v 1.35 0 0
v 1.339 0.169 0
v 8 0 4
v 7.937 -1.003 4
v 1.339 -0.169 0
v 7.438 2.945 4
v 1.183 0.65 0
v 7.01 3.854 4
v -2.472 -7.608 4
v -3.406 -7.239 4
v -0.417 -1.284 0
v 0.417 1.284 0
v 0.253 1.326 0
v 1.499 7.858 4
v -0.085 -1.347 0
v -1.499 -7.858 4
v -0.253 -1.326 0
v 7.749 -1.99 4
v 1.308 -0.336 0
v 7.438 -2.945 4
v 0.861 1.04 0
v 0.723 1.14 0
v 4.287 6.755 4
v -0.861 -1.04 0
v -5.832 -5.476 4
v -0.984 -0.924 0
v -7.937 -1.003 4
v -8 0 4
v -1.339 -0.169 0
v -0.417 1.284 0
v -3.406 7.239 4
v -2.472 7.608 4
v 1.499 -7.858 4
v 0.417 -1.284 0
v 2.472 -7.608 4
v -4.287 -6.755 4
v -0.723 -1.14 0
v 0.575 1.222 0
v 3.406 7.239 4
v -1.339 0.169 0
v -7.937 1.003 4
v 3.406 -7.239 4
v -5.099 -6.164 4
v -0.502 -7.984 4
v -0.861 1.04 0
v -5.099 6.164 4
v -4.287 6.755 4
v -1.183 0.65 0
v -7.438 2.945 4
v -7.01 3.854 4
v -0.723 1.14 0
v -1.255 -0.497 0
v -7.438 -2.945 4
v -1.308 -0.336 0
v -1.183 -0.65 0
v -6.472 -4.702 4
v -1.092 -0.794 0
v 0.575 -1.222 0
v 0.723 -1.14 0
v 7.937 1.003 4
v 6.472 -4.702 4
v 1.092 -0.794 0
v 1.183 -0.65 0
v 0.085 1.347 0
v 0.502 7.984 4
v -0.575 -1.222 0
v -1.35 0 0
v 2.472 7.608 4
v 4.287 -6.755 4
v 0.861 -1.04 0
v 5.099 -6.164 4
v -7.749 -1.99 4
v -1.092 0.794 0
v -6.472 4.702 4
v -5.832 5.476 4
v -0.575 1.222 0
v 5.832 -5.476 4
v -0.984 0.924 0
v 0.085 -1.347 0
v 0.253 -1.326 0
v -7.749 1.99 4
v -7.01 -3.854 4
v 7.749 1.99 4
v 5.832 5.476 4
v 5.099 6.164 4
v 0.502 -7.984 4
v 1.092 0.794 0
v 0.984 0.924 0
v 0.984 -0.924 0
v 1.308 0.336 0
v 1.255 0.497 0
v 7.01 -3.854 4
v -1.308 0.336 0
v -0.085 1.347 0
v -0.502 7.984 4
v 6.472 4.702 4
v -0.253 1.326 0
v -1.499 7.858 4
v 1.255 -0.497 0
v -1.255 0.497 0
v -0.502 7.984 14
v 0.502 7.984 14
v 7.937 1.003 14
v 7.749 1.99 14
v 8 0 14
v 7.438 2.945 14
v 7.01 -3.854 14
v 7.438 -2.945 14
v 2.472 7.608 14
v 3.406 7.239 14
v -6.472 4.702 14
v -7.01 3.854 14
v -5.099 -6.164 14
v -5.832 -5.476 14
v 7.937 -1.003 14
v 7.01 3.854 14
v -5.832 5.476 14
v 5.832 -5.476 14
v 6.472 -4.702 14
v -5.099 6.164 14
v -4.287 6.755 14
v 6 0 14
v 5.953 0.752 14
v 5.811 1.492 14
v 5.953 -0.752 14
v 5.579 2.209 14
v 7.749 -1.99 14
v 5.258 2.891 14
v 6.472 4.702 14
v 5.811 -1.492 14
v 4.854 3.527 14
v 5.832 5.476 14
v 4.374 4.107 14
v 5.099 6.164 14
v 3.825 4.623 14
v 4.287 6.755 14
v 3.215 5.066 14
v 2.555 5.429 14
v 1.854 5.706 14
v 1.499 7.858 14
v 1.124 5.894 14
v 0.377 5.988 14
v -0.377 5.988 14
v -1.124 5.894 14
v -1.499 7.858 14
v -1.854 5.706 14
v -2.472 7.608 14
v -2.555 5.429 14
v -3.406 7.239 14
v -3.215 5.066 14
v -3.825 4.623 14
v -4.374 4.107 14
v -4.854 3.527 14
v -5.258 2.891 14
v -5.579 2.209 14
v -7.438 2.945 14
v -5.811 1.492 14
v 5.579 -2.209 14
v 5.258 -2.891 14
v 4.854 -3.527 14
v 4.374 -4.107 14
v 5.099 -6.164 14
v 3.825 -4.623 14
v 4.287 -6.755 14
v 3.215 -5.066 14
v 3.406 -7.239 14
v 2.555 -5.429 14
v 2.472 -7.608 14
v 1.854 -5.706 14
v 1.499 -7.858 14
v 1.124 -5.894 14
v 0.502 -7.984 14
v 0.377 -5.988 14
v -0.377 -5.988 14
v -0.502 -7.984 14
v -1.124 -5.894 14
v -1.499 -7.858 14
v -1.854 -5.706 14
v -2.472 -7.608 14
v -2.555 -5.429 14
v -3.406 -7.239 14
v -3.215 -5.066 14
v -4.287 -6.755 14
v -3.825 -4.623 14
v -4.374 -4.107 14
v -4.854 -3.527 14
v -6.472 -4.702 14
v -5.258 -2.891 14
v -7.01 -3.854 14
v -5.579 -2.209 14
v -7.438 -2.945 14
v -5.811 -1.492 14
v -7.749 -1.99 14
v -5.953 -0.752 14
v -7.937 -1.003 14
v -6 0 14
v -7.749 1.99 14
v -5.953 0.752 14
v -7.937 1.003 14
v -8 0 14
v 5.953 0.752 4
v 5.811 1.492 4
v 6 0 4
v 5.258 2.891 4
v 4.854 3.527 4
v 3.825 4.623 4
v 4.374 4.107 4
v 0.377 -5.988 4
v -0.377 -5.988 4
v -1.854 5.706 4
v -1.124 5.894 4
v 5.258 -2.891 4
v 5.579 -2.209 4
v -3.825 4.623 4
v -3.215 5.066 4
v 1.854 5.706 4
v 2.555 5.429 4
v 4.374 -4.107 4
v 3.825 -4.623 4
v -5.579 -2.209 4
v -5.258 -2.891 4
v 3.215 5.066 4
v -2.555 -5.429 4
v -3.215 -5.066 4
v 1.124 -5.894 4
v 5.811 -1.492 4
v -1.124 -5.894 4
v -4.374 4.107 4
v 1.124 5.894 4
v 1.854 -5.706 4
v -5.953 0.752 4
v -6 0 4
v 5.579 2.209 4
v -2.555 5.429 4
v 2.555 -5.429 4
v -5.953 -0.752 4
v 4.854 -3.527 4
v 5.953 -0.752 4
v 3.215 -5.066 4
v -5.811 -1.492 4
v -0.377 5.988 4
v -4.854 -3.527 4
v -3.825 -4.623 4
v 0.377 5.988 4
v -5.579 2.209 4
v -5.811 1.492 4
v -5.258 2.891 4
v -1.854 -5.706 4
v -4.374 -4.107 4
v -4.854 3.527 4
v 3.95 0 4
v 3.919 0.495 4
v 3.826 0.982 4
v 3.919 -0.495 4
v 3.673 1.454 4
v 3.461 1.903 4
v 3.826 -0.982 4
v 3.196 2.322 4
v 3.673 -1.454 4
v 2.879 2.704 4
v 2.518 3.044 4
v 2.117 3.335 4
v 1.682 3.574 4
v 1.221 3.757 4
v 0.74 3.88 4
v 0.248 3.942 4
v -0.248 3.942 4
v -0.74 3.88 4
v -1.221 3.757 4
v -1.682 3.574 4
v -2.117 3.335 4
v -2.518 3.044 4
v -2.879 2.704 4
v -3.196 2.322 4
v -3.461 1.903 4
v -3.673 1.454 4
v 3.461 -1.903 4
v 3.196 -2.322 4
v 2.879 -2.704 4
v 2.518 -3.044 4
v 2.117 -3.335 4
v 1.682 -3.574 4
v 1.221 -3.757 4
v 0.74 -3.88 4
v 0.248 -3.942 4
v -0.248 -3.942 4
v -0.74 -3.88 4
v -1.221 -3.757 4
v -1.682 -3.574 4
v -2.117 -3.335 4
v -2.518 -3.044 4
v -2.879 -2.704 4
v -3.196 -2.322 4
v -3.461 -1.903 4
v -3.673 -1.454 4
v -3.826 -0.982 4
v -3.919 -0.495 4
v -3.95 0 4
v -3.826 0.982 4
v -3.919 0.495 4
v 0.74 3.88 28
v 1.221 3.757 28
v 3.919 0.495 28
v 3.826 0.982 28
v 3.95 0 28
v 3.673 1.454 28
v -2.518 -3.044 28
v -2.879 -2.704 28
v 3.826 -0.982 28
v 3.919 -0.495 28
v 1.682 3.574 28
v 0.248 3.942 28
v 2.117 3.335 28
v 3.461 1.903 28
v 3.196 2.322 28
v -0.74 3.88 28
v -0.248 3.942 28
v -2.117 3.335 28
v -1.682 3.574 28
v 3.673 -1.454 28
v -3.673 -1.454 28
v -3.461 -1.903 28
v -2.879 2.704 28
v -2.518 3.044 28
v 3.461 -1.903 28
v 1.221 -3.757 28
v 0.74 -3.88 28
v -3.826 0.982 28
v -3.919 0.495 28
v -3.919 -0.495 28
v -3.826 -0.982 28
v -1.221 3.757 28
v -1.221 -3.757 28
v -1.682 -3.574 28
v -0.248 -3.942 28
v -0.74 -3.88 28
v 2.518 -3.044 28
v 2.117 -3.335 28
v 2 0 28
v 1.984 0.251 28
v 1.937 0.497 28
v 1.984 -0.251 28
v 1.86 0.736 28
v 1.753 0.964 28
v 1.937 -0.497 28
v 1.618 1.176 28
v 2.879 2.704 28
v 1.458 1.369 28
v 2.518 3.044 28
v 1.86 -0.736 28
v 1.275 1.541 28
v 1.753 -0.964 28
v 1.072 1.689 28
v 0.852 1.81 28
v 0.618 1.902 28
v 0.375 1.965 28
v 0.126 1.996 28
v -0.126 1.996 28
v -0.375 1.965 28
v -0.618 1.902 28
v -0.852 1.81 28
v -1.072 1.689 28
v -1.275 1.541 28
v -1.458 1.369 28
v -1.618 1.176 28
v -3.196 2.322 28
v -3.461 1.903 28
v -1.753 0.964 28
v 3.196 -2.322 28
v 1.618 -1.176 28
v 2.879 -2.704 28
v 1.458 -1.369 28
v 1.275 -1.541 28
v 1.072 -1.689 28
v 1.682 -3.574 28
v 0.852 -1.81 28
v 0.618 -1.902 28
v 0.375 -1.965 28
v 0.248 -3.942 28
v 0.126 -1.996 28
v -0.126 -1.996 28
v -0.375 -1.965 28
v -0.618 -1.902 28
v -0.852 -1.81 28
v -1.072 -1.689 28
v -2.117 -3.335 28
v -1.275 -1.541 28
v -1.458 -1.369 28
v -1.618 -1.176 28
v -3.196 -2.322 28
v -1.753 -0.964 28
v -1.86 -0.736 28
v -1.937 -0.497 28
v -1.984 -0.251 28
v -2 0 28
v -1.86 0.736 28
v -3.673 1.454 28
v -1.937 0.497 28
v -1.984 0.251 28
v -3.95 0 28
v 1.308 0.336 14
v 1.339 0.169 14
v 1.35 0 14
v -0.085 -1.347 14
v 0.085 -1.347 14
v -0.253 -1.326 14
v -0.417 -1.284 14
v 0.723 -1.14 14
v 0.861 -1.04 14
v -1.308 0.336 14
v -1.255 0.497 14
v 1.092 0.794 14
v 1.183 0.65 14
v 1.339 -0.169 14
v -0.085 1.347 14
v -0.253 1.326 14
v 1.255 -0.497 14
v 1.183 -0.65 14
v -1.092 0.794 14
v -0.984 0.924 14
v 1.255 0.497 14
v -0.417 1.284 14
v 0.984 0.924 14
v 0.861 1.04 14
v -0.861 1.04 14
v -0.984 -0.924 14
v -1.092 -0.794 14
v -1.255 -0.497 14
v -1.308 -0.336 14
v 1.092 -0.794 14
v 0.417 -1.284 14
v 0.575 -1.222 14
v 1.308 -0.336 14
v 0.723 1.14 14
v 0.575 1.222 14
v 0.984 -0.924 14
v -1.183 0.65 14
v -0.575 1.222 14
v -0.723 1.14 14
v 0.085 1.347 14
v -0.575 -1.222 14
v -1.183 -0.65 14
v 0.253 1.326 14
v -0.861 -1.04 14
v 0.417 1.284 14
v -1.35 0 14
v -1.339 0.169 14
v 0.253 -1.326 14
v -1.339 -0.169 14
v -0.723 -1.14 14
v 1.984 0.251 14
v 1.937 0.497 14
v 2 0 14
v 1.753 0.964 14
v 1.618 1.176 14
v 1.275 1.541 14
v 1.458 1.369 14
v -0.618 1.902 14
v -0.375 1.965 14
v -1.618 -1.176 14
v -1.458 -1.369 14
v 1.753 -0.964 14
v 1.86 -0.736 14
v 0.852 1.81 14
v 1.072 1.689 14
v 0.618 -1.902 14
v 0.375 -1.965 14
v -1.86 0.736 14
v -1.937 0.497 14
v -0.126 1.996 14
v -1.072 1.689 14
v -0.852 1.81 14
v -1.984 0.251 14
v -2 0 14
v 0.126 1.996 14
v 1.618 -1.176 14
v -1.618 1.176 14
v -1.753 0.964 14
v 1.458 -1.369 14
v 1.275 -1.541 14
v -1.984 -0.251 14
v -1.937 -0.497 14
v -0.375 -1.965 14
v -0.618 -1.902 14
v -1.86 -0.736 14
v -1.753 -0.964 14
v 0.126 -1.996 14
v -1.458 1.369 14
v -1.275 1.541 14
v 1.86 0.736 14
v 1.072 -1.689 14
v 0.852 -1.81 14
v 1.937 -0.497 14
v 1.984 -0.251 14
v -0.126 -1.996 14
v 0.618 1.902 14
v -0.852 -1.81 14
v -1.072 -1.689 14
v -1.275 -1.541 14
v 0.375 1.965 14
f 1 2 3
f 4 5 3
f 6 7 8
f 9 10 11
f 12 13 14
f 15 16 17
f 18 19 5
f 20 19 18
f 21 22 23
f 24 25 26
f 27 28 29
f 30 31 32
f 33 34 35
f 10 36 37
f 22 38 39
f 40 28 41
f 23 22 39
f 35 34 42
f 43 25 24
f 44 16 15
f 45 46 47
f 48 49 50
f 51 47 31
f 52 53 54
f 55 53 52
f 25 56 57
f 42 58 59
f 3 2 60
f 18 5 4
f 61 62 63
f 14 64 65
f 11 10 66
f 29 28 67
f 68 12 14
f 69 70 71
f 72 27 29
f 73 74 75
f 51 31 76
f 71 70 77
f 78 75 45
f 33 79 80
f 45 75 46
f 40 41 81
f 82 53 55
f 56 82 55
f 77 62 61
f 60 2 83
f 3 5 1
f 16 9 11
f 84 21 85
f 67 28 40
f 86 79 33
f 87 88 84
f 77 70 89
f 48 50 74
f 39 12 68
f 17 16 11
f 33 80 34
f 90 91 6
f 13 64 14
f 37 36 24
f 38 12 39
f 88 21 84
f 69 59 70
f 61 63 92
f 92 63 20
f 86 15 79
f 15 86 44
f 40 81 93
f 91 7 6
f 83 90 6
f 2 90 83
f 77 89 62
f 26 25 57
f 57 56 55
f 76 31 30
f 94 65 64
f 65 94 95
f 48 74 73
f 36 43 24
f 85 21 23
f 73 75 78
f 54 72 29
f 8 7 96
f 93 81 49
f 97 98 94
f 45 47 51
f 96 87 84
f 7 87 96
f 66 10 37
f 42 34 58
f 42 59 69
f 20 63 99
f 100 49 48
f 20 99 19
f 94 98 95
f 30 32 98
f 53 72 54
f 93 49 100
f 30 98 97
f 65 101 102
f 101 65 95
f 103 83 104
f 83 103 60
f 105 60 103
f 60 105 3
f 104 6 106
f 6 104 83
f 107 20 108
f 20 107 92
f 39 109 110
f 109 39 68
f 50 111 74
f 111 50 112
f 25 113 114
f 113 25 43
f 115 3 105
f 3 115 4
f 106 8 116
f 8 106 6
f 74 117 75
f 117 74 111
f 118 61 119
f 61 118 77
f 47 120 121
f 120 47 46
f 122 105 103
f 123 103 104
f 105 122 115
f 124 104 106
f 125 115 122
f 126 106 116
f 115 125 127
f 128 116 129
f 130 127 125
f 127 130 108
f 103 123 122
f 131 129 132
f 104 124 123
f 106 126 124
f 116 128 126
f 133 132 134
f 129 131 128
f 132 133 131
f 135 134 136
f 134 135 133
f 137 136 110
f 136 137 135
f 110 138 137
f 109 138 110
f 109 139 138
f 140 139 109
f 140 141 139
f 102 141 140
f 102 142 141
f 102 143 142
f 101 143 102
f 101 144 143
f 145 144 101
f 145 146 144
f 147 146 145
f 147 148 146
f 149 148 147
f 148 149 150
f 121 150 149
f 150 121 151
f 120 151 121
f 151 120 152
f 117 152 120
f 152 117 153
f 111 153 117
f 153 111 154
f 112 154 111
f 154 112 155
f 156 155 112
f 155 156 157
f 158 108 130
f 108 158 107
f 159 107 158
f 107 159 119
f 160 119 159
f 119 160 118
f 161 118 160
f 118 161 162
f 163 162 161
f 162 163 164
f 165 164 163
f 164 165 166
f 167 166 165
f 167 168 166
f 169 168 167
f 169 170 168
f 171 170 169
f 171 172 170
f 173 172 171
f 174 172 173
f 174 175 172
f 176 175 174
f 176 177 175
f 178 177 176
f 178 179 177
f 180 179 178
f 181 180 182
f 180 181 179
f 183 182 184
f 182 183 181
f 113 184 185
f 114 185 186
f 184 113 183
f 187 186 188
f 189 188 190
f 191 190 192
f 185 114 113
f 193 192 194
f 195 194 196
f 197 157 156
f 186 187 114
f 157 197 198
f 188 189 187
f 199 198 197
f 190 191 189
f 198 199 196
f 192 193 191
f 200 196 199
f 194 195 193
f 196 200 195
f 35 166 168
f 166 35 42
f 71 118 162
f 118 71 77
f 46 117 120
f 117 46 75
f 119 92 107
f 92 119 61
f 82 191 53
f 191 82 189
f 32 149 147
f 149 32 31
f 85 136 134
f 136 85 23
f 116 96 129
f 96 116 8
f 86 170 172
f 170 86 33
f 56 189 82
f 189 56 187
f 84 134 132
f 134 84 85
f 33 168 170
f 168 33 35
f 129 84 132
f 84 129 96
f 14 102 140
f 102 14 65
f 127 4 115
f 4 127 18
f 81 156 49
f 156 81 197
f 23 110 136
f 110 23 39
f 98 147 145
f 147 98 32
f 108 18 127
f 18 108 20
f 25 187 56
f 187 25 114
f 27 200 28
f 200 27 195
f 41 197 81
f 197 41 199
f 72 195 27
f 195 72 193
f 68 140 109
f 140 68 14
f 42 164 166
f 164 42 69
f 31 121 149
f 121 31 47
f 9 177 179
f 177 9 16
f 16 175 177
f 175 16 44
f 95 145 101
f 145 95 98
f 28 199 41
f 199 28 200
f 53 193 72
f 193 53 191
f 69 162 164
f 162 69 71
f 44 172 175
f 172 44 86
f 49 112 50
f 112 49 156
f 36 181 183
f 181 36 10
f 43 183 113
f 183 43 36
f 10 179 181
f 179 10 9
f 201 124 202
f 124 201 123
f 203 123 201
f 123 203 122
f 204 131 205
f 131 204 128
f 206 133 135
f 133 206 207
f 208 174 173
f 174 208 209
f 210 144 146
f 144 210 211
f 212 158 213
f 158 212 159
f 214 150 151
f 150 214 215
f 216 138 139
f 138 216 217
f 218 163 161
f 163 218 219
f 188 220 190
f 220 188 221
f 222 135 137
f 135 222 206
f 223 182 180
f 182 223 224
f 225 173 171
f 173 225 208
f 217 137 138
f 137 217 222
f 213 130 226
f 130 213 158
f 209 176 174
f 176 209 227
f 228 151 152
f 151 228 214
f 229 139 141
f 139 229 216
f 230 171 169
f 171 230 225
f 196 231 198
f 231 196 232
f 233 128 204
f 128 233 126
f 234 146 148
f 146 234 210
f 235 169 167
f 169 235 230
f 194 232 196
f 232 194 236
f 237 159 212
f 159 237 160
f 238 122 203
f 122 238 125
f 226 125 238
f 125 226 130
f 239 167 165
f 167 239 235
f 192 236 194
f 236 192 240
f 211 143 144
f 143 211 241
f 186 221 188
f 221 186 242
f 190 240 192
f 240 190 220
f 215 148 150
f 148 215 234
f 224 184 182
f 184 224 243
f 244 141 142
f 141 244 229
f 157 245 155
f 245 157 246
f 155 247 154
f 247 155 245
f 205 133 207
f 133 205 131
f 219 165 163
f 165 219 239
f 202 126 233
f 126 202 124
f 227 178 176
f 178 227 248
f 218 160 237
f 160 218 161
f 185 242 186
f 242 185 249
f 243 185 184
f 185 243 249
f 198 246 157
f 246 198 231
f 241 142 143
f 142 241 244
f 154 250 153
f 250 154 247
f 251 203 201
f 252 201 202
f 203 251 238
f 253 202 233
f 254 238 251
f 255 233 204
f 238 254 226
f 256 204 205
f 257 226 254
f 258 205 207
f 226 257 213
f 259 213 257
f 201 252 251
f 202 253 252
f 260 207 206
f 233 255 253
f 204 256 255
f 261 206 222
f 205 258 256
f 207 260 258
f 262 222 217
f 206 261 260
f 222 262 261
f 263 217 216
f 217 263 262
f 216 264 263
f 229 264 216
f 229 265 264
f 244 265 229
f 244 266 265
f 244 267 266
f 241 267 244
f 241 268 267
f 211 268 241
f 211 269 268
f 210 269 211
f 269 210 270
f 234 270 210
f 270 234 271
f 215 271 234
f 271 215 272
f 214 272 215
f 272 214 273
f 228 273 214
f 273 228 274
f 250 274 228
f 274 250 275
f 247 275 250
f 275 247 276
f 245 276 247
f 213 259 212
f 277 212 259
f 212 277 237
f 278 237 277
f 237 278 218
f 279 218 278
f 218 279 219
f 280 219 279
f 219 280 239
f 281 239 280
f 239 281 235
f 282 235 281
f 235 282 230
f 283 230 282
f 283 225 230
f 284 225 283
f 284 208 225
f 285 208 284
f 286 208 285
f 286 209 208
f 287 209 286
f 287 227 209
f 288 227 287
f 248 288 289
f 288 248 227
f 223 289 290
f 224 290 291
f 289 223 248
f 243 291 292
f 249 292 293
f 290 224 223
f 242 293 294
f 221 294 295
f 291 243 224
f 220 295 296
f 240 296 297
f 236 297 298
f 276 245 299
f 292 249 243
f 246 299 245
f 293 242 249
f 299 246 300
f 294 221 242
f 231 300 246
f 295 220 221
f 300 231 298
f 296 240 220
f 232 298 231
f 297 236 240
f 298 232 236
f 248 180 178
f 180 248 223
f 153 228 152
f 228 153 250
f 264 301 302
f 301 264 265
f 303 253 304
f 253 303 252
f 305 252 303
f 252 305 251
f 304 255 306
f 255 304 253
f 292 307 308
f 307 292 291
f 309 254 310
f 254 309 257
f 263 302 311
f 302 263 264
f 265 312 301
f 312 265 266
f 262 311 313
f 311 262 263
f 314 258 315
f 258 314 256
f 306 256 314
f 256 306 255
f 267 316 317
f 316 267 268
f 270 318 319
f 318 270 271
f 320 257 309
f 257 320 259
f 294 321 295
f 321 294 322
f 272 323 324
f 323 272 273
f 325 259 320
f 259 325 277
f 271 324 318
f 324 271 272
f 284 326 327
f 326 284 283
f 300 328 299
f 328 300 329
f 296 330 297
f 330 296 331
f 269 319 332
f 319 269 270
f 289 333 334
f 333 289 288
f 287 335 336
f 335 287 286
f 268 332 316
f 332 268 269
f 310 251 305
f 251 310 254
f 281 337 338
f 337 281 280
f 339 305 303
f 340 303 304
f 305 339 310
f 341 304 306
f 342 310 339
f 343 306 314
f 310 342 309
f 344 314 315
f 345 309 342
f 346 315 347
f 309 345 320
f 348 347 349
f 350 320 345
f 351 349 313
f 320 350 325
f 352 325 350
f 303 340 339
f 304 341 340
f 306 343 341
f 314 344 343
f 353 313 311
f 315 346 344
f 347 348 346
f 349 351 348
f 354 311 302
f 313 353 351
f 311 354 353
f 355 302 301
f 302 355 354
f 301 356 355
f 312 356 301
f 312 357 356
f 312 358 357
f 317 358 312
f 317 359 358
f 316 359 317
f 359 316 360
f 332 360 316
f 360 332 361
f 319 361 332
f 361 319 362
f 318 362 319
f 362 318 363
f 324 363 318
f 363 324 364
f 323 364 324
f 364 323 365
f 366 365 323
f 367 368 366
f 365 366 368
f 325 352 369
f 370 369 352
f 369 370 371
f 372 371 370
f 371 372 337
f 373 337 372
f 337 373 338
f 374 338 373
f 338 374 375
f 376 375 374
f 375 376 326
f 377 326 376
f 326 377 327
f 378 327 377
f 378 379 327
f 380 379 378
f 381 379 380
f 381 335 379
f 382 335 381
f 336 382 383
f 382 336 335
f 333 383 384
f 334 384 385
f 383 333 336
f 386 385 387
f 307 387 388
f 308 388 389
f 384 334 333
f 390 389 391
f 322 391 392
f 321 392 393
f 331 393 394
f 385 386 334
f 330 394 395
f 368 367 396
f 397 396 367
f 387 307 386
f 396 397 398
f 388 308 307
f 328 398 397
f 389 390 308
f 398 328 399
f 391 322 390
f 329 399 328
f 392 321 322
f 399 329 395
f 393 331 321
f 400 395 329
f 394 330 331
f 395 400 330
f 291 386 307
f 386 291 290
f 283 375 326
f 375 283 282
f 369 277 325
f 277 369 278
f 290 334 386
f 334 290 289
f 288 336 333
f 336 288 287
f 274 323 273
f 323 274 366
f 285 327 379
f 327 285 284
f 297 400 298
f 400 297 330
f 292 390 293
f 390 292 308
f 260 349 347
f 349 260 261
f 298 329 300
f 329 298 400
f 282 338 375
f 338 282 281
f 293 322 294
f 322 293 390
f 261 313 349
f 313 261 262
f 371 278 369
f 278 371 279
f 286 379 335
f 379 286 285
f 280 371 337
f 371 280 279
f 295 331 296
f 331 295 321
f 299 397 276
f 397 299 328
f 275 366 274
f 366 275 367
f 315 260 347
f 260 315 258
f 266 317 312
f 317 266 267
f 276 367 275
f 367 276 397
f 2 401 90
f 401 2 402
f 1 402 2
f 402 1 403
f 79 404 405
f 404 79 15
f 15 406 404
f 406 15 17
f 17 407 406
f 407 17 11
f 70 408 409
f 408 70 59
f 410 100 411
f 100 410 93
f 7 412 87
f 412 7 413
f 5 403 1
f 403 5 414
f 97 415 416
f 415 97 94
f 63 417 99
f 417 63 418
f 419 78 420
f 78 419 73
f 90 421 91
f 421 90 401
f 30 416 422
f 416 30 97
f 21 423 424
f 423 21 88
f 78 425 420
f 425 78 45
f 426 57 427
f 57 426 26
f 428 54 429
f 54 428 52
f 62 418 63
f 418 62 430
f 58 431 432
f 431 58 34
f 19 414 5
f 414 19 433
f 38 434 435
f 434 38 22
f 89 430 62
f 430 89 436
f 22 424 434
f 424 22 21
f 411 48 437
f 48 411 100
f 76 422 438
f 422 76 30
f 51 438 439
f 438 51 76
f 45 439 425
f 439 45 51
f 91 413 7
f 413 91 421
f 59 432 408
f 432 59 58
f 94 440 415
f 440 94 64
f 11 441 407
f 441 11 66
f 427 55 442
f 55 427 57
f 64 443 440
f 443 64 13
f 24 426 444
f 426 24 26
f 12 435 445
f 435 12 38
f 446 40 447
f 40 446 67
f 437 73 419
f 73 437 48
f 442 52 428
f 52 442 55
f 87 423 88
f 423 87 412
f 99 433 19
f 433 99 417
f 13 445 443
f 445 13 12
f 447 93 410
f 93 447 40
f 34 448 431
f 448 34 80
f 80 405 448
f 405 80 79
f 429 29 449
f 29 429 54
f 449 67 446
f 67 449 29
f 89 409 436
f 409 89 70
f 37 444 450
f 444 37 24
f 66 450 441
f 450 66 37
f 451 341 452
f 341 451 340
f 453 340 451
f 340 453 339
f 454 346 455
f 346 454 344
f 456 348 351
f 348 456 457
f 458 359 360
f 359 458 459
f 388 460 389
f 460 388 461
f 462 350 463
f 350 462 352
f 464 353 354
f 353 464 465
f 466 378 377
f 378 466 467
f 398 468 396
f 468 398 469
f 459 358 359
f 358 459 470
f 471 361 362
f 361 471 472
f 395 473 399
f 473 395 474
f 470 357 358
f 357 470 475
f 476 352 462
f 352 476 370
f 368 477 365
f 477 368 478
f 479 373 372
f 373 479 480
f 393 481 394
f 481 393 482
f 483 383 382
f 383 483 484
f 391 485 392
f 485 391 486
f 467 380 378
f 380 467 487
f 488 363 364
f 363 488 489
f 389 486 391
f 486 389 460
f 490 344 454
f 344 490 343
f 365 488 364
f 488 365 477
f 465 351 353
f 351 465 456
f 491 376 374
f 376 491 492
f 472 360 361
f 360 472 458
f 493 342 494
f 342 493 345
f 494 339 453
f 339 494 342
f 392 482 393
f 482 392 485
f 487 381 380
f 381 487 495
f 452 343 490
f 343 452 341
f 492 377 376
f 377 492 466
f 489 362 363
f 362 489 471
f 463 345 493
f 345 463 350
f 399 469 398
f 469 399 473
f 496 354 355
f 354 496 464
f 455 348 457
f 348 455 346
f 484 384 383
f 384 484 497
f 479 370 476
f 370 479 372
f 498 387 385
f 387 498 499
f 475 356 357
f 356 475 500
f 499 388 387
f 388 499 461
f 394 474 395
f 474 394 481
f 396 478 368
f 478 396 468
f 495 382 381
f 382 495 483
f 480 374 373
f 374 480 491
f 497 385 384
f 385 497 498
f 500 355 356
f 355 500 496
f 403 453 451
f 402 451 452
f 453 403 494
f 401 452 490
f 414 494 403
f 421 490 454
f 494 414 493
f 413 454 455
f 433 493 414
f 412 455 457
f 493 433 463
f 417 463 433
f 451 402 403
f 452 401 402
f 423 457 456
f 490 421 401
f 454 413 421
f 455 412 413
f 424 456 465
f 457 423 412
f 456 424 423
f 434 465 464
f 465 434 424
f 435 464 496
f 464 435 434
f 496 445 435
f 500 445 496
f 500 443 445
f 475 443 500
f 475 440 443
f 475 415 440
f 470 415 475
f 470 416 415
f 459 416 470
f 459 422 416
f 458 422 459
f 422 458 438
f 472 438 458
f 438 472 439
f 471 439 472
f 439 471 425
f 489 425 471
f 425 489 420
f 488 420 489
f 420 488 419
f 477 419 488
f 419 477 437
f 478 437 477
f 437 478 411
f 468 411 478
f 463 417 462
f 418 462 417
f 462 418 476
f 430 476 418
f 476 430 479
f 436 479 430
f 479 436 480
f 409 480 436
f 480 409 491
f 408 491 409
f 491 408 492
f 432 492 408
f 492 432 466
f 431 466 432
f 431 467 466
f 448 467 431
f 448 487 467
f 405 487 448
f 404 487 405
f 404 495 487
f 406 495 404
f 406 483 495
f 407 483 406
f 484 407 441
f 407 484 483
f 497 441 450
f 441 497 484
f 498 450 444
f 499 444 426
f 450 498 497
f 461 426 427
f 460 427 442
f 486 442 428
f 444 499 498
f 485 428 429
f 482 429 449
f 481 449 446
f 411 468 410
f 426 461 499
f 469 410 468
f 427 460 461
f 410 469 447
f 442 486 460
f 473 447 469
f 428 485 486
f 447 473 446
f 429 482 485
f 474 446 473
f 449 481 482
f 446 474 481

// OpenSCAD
$fn = 50;

d = 7.9;
height = 28;

hole_d = 2.7;

big_hole_d = 4;
big_hole_height = 14;

cap_external_d = 16;
cap_internal_d = 12;
cap_external_height = 14;
cap_internal_height = 10;

difference() {
    diff = cap_external_height - cap_internal_height;

    union() {
        translate([0,0,diff])
        cylinder(r1=d/2, r2=d/2, h=height-diff);
        cap();
    }
    cylinder(r1=hole_d/2, r2=hole_d/2, h=height);
    translate([0, 0, height-big_hole_height])
    cylinder(r1=big_hole_d/2, r2=big_hole_d/2, h=big_hole_height);
};


module cap() {
    diff = cap_external_height - cap_internal_height;
    difference() {
        union() {
            cylinder(r1=hole_d/2, r2=cap_external_d/2, h=diff);
            translate([0,0,diff])
            cylinder(r1=cap_external_d/2, r2=cap_external_d/2, h=cap_internal_height);
        };
        translate([0, 0, diff])
        cylinder(r1=cap_internal_d/2, r2=cap_internal_d/2, h=cap_internal_height);
    };
};
